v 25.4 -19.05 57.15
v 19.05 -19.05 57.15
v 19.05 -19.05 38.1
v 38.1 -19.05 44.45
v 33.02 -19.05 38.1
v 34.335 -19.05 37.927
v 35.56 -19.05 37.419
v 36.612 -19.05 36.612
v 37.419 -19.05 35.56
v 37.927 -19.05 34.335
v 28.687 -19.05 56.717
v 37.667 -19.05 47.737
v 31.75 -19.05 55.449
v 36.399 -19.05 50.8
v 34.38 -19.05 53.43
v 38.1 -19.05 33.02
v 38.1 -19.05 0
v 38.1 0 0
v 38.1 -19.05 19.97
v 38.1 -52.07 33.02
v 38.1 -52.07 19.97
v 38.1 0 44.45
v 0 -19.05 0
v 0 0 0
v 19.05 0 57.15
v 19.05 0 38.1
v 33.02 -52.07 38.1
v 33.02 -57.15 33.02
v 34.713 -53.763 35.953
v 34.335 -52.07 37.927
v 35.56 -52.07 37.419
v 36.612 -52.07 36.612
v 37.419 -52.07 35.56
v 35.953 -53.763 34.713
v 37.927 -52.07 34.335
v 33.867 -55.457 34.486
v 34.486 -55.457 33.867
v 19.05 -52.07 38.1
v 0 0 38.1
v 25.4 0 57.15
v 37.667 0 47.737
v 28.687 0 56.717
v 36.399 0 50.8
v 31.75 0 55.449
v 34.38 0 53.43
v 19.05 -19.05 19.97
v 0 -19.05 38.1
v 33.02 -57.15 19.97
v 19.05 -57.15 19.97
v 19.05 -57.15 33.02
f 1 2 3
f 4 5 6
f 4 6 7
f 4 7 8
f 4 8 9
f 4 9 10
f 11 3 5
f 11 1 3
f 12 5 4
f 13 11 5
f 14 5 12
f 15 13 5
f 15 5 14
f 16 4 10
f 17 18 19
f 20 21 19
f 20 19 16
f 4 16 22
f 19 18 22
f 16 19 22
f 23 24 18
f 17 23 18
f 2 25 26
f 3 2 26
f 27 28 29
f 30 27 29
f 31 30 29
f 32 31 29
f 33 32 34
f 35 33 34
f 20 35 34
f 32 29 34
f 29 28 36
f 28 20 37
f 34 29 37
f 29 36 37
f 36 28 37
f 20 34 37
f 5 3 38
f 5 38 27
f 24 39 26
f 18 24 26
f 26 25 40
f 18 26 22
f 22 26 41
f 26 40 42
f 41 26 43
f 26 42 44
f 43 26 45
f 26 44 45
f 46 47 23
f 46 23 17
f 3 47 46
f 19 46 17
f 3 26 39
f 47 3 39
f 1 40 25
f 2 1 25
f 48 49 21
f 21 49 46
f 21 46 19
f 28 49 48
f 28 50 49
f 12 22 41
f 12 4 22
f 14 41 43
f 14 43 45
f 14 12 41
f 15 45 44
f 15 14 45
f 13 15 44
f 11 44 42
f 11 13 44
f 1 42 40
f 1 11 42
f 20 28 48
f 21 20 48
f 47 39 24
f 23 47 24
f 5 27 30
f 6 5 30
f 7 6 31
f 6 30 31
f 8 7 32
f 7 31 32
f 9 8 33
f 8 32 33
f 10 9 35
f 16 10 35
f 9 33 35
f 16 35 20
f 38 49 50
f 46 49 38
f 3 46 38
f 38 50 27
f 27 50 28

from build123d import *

# Parameters (mm, degrees)
F1_DEPTH = 19.05
F2_W     = 19.05
F2_H     = 18.12971
F3_DEPTH = 38.1
F4_R     = 5.08
F5_SIZE  = 5.08
F6_R     = 12.7


with BuildPart() as f1:
    # F0 (on Front) → F1 (new body)
    with BuildSketch(Plane.XZ):
        Polygon((0, 38.1), (0, 0), (38.1, 0), (38.1, 38.1), (38.1, 57.15), (19.05, 57.15), (19.05, 38.1), align=None)
    extrude(amount=F1_DEPTH)

    # F2 (on face) → F3 (join)
    with BuildSketch(Plane.XZ.offset(19.05)):
        with Locations((28.575, 29.035145)):
            Rectangle(F2_W, F2_H)
    extrude(amount=F3_DEPTH)

    # F4
    f4_edges = [f1.edges().sort_by_distance(p)[0] for p in [
        (38.1, -38.1, 38.1),
    ]]
    fillet(f4_edges, radius=F4_R)

    # F5
    f5_edges = [f1.edges().sort_by_distance(p)[0] for p in [
        (26.035, -57.15, 38.1),
    ]]
    chamfer(f5_edges, length=F5_SIZE)

    # F6
    f6_edges = [f1.edges().sort_by_distance(p)[0] for p in [
        (38.1, -9.525, 57.15),
    ]]
    fillet(f6_edges, radius=F6_R)


solid = f1.part
